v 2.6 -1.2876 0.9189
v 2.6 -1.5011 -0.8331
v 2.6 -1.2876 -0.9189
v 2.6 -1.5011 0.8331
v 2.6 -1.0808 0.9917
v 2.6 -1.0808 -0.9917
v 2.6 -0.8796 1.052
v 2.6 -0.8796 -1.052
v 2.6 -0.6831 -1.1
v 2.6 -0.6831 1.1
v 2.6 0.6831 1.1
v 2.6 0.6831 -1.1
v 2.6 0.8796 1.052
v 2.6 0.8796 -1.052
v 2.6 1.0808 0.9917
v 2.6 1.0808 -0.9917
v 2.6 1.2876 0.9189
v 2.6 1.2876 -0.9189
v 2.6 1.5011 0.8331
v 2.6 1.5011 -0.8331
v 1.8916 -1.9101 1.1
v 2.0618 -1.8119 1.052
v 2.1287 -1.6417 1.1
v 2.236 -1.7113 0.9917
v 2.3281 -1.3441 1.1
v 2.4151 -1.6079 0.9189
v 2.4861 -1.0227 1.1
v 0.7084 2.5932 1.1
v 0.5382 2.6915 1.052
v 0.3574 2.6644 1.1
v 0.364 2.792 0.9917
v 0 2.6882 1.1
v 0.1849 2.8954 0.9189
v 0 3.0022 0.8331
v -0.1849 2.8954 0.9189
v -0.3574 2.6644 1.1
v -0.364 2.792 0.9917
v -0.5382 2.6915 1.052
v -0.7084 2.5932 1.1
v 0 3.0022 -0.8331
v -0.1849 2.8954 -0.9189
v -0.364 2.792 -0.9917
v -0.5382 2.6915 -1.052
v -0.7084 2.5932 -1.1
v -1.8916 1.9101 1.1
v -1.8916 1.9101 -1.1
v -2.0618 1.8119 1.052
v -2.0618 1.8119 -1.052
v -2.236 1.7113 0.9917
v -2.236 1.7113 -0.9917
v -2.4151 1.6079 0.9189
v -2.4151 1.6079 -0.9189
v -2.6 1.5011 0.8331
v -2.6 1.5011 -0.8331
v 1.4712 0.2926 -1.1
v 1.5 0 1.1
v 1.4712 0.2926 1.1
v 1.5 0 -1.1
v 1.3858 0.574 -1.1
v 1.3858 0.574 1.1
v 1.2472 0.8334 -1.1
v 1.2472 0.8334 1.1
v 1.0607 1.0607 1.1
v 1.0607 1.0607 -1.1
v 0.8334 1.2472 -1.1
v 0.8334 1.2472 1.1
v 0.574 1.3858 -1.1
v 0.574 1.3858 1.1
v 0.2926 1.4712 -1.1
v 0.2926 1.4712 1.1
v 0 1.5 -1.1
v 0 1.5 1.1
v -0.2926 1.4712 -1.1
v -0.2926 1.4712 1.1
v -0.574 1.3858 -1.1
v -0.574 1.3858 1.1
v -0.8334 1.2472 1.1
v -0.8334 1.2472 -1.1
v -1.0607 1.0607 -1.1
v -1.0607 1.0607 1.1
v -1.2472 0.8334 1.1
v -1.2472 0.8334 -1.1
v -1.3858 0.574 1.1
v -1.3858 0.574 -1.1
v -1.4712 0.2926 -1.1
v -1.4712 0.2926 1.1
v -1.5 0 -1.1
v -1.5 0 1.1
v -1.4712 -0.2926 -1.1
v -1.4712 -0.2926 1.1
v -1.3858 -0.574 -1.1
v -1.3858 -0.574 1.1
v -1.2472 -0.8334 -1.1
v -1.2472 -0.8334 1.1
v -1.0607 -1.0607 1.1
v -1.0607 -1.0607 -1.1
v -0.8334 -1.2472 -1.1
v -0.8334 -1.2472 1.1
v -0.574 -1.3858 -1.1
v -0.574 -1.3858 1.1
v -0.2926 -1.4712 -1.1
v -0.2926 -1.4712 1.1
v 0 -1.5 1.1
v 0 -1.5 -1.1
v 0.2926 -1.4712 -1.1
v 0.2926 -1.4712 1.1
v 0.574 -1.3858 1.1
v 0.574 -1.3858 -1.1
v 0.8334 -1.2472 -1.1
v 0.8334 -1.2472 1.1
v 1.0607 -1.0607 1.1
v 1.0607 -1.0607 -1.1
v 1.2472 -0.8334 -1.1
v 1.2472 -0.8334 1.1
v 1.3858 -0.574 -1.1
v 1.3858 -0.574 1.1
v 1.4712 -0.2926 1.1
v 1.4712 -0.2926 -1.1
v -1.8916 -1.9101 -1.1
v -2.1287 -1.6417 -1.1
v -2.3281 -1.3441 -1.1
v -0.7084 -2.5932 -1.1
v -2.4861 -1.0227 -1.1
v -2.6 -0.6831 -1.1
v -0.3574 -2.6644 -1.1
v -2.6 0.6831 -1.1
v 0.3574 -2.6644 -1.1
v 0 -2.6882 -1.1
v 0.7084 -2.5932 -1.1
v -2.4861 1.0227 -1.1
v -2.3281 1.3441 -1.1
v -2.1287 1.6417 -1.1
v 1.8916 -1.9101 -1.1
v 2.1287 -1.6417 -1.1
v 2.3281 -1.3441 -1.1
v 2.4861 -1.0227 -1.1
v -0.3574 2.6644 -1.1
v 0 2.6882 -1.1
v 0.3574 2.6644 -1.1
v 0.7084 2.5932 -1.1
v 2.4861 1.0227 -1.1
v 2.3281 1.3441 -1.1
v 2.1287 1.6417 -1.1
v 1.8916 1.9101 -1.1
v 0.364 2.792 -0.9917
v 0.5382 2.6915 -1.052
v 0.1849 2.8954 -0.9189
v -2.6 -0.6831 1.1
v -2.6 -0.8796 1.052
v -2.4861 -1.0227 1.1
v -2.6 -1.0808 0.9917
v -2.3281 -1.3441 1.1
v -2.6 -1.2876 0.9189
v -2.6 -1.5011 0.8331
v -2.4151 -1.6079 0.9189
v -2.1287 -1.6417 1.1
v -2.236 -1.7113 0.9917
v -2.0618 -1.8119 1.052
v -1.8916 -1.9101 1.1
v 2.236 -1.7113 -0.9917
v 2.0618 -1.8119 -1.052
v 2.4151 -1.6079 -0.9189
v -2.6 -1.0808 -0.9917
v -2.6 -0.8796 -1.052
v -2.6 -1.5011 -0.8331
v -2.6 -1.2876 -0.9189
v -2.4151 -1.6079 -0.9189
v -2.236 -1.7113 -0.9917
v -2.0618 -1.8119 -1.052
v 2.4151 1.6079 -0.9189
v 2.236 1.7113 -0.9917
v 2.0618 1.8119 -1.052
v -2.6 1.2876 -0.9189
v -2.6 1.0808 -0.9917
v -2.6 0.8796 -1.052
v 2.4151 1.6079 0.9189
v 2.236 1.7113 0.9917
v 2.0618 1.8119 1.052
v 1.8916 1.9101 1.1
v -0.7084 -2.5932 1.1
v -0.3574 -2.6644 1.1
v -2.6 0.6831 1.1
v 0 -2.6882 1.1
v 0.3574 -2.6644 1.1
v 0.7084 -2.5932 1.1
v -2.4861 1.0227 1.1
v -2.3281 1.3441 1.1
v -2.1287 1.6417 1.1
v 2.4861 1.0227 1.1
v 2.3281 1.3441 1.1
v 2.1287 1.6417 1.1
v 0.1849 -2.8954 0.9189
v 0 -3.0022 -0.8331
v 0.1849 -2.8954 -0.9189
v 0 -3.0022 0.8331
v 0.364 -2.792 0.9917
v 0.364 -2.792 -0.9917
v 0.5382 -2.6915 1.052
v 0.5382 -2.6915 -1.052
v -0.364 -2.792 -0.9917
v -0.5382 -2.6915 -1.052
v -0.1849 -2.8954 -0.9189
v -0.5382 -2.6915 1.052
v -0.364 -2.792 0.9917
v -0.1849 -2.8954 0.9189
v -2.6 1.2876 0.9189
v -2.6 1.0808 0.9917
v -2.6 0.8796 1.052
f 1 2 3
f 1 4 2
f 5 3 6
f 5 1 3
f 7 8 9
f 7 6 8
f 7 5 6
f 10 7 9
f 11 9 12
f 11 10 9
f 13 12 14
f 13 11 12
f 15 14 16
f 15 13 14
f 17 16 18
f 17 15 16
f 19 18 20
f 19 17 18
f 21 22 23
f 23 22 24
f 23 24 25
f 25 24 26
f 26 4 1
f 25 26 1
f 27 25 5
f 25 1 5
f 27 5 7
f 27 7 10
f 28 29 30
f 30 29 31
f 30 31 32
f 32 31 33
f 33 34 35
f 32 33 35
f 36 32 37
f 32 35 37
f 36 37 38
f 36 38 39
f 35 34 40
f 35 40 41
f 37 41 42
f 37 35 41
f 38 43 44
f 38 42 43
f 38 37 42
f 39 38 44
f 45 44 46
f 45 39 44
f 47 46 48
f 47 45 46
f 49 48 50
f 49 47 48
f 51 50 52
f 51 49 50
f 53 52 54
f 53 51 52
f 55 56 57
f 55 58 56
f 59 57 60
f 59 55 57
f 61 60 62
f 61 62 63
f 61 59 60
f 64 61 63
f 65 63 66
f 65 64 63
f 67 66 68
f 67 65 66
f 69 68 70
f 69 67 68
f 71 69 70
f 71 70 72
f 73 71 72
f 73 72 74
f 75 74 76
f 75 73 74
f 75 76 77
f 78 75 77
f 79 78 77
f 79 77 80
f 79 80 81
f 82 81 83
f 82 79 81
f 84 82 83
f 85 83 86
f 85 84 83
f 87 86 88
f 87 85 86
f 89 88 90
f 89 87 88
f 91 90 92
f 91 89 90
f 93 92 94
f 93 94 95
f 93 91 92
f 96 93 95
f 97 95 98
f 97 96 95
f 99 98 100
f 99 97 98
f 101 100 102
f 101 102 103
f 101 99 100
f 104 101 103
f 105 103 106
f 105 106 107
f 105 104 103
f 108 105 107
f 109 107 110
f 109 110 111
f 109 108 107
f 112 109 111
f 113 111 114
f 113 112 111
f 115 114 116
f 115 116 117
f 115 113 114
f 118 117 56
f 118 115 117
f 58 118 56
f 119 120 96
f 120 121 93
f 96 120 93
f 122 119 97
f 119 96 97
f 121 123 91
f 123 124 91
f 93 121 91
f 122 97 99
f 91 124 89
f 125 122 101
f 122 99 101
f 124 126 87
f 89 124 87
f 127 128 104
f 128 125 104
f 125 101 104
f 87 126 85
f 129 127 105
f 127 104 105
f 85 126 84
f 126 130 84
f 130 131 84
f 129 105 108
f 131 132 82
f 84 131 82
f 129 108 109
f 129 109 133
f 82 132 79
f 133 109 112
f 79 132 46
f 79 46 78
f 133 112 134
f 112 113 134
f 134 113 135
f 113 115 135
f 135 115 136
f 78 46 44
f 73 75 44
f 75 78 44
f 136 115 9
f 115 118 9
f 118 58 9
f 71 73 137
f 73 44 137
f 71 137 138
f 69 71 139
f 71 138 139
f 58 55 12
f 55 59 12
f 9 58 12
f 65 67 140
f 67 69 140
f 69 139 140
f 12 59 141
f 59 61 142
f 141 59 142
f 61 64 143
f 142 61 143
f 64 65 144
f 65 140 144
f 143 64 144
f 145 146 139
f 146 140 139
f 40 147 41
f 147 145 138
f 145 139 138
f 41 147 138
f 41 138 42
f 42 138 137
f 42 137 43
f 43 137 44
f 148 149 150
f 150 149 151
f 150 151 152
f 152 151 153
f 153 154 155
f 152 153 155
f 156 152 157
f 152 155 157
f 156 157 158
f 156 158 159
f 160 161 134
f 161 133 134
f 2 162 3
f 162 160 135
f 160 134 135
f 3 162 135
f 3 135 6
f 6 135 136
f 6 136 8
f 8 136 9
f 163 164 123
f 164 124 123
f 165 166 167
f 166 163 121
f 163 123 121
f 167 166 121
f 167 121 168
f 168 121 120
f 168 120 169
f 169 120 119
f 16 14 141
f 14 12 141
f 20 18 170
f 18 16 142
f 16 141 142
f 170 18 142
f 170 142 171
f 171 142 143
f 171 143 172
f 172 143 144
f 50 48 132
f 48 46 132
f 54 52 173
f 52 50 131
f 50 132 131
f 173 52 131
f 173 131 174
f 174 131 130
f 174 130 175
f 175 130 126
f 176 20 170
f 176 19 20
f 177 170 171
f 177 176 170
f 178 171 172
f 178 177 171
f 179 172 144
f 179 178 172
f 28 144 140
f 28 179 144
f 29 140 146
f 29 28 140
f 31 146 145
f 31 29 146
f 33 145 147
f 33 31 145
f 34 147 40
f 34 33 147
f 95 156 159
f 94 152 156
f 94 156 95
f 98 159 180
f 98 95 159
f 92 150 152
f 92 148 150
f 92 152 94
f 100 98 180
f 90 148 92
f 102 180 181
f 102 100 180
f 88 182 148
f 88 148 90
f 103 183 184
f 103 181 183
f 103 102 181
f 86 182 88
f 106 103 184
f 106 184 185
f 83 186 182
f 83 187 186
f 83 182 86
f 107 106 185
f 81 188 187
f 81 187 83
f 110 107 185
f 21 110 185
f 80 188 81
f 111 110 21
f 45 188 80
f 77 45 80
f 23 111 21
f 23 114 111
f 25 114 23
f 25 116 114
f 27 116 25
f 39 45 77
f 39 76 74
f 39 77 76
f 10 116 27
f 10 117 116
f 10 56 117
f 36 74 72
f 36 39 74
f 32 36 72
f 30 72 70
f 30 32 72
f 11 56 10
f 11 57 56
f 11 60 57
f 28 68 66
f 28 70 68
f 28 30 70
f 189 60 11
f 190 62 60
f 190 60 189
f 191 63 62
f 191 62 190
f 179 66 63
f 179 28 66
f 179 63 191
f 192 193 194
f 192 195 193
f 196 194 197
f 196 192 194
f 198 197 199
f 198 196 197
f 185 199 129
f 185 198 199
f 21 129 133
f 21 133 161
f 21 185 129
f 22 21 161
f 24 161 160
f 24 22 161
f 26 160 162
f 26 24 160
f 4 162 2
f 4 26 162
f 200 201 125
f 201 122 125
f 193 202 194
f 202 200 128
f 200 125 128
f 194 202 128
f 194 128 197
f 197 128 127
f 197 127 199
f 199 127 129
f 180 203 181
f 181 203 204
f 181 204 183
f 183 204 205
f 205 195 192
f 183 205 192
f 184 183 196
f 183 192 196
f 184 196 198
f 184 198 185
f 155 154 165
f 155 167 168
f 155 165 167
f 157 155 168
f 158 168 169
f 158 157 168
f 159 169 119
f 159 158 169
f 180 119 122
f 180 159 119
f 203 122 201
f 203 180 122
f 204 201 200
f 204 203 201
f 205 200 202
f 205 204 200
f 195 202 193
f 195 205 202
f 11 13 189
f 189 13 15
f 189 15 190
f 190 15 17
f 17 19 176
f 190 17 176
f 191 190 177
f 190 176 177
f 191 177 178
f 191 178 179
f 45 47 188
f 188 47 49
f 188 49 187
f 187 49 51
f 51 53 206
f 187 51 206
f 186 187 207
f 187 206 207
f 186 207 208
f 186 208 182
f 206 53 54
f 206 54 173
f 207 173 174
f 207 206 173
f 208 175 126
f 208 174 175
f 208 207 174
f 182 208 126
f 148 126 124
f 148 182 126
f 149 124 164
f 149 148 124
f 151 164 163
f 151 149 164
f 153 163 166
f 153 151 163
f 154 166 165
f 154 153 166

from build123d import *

# Parameters (mm, degrees)
SKETCH_R  = 1.5
PAD_DEPTH = 1.1


with BuildPart() as body001:
    # Sketch002 → Revolution (revolve)
    with BuildSketch(Plane.YZ):
        Polygon((2.1, 1.6), (3.1, 0.75), (3.1, -0.75), (2.1, -1.6), (4.1, -1.6), (4.1, 1.6), align=None)
    revolve(axis=Axis((0, 0, 0), (0, 0, 1)))


with BuildPart() as cut:
    # Sketch → Pad (new body, symmetric)
    with BuildSketch(Plane.XY):
        Polygon((2.6, 1.501111), (0, 3.002221), (-2.6, 1.501111), (-2.6, -1.501111), (0, -3.002221), (2.6, -1.501111), align=None)
        Circle(SKETCH_R, mode=Mode.SUBTRACT)
    extrude(amount=PAD_DEPTH, both=True)

    # Cut: cut Body001
    add(body001.part, mode=Mode.SUBTRACT)


solid = cut.part
